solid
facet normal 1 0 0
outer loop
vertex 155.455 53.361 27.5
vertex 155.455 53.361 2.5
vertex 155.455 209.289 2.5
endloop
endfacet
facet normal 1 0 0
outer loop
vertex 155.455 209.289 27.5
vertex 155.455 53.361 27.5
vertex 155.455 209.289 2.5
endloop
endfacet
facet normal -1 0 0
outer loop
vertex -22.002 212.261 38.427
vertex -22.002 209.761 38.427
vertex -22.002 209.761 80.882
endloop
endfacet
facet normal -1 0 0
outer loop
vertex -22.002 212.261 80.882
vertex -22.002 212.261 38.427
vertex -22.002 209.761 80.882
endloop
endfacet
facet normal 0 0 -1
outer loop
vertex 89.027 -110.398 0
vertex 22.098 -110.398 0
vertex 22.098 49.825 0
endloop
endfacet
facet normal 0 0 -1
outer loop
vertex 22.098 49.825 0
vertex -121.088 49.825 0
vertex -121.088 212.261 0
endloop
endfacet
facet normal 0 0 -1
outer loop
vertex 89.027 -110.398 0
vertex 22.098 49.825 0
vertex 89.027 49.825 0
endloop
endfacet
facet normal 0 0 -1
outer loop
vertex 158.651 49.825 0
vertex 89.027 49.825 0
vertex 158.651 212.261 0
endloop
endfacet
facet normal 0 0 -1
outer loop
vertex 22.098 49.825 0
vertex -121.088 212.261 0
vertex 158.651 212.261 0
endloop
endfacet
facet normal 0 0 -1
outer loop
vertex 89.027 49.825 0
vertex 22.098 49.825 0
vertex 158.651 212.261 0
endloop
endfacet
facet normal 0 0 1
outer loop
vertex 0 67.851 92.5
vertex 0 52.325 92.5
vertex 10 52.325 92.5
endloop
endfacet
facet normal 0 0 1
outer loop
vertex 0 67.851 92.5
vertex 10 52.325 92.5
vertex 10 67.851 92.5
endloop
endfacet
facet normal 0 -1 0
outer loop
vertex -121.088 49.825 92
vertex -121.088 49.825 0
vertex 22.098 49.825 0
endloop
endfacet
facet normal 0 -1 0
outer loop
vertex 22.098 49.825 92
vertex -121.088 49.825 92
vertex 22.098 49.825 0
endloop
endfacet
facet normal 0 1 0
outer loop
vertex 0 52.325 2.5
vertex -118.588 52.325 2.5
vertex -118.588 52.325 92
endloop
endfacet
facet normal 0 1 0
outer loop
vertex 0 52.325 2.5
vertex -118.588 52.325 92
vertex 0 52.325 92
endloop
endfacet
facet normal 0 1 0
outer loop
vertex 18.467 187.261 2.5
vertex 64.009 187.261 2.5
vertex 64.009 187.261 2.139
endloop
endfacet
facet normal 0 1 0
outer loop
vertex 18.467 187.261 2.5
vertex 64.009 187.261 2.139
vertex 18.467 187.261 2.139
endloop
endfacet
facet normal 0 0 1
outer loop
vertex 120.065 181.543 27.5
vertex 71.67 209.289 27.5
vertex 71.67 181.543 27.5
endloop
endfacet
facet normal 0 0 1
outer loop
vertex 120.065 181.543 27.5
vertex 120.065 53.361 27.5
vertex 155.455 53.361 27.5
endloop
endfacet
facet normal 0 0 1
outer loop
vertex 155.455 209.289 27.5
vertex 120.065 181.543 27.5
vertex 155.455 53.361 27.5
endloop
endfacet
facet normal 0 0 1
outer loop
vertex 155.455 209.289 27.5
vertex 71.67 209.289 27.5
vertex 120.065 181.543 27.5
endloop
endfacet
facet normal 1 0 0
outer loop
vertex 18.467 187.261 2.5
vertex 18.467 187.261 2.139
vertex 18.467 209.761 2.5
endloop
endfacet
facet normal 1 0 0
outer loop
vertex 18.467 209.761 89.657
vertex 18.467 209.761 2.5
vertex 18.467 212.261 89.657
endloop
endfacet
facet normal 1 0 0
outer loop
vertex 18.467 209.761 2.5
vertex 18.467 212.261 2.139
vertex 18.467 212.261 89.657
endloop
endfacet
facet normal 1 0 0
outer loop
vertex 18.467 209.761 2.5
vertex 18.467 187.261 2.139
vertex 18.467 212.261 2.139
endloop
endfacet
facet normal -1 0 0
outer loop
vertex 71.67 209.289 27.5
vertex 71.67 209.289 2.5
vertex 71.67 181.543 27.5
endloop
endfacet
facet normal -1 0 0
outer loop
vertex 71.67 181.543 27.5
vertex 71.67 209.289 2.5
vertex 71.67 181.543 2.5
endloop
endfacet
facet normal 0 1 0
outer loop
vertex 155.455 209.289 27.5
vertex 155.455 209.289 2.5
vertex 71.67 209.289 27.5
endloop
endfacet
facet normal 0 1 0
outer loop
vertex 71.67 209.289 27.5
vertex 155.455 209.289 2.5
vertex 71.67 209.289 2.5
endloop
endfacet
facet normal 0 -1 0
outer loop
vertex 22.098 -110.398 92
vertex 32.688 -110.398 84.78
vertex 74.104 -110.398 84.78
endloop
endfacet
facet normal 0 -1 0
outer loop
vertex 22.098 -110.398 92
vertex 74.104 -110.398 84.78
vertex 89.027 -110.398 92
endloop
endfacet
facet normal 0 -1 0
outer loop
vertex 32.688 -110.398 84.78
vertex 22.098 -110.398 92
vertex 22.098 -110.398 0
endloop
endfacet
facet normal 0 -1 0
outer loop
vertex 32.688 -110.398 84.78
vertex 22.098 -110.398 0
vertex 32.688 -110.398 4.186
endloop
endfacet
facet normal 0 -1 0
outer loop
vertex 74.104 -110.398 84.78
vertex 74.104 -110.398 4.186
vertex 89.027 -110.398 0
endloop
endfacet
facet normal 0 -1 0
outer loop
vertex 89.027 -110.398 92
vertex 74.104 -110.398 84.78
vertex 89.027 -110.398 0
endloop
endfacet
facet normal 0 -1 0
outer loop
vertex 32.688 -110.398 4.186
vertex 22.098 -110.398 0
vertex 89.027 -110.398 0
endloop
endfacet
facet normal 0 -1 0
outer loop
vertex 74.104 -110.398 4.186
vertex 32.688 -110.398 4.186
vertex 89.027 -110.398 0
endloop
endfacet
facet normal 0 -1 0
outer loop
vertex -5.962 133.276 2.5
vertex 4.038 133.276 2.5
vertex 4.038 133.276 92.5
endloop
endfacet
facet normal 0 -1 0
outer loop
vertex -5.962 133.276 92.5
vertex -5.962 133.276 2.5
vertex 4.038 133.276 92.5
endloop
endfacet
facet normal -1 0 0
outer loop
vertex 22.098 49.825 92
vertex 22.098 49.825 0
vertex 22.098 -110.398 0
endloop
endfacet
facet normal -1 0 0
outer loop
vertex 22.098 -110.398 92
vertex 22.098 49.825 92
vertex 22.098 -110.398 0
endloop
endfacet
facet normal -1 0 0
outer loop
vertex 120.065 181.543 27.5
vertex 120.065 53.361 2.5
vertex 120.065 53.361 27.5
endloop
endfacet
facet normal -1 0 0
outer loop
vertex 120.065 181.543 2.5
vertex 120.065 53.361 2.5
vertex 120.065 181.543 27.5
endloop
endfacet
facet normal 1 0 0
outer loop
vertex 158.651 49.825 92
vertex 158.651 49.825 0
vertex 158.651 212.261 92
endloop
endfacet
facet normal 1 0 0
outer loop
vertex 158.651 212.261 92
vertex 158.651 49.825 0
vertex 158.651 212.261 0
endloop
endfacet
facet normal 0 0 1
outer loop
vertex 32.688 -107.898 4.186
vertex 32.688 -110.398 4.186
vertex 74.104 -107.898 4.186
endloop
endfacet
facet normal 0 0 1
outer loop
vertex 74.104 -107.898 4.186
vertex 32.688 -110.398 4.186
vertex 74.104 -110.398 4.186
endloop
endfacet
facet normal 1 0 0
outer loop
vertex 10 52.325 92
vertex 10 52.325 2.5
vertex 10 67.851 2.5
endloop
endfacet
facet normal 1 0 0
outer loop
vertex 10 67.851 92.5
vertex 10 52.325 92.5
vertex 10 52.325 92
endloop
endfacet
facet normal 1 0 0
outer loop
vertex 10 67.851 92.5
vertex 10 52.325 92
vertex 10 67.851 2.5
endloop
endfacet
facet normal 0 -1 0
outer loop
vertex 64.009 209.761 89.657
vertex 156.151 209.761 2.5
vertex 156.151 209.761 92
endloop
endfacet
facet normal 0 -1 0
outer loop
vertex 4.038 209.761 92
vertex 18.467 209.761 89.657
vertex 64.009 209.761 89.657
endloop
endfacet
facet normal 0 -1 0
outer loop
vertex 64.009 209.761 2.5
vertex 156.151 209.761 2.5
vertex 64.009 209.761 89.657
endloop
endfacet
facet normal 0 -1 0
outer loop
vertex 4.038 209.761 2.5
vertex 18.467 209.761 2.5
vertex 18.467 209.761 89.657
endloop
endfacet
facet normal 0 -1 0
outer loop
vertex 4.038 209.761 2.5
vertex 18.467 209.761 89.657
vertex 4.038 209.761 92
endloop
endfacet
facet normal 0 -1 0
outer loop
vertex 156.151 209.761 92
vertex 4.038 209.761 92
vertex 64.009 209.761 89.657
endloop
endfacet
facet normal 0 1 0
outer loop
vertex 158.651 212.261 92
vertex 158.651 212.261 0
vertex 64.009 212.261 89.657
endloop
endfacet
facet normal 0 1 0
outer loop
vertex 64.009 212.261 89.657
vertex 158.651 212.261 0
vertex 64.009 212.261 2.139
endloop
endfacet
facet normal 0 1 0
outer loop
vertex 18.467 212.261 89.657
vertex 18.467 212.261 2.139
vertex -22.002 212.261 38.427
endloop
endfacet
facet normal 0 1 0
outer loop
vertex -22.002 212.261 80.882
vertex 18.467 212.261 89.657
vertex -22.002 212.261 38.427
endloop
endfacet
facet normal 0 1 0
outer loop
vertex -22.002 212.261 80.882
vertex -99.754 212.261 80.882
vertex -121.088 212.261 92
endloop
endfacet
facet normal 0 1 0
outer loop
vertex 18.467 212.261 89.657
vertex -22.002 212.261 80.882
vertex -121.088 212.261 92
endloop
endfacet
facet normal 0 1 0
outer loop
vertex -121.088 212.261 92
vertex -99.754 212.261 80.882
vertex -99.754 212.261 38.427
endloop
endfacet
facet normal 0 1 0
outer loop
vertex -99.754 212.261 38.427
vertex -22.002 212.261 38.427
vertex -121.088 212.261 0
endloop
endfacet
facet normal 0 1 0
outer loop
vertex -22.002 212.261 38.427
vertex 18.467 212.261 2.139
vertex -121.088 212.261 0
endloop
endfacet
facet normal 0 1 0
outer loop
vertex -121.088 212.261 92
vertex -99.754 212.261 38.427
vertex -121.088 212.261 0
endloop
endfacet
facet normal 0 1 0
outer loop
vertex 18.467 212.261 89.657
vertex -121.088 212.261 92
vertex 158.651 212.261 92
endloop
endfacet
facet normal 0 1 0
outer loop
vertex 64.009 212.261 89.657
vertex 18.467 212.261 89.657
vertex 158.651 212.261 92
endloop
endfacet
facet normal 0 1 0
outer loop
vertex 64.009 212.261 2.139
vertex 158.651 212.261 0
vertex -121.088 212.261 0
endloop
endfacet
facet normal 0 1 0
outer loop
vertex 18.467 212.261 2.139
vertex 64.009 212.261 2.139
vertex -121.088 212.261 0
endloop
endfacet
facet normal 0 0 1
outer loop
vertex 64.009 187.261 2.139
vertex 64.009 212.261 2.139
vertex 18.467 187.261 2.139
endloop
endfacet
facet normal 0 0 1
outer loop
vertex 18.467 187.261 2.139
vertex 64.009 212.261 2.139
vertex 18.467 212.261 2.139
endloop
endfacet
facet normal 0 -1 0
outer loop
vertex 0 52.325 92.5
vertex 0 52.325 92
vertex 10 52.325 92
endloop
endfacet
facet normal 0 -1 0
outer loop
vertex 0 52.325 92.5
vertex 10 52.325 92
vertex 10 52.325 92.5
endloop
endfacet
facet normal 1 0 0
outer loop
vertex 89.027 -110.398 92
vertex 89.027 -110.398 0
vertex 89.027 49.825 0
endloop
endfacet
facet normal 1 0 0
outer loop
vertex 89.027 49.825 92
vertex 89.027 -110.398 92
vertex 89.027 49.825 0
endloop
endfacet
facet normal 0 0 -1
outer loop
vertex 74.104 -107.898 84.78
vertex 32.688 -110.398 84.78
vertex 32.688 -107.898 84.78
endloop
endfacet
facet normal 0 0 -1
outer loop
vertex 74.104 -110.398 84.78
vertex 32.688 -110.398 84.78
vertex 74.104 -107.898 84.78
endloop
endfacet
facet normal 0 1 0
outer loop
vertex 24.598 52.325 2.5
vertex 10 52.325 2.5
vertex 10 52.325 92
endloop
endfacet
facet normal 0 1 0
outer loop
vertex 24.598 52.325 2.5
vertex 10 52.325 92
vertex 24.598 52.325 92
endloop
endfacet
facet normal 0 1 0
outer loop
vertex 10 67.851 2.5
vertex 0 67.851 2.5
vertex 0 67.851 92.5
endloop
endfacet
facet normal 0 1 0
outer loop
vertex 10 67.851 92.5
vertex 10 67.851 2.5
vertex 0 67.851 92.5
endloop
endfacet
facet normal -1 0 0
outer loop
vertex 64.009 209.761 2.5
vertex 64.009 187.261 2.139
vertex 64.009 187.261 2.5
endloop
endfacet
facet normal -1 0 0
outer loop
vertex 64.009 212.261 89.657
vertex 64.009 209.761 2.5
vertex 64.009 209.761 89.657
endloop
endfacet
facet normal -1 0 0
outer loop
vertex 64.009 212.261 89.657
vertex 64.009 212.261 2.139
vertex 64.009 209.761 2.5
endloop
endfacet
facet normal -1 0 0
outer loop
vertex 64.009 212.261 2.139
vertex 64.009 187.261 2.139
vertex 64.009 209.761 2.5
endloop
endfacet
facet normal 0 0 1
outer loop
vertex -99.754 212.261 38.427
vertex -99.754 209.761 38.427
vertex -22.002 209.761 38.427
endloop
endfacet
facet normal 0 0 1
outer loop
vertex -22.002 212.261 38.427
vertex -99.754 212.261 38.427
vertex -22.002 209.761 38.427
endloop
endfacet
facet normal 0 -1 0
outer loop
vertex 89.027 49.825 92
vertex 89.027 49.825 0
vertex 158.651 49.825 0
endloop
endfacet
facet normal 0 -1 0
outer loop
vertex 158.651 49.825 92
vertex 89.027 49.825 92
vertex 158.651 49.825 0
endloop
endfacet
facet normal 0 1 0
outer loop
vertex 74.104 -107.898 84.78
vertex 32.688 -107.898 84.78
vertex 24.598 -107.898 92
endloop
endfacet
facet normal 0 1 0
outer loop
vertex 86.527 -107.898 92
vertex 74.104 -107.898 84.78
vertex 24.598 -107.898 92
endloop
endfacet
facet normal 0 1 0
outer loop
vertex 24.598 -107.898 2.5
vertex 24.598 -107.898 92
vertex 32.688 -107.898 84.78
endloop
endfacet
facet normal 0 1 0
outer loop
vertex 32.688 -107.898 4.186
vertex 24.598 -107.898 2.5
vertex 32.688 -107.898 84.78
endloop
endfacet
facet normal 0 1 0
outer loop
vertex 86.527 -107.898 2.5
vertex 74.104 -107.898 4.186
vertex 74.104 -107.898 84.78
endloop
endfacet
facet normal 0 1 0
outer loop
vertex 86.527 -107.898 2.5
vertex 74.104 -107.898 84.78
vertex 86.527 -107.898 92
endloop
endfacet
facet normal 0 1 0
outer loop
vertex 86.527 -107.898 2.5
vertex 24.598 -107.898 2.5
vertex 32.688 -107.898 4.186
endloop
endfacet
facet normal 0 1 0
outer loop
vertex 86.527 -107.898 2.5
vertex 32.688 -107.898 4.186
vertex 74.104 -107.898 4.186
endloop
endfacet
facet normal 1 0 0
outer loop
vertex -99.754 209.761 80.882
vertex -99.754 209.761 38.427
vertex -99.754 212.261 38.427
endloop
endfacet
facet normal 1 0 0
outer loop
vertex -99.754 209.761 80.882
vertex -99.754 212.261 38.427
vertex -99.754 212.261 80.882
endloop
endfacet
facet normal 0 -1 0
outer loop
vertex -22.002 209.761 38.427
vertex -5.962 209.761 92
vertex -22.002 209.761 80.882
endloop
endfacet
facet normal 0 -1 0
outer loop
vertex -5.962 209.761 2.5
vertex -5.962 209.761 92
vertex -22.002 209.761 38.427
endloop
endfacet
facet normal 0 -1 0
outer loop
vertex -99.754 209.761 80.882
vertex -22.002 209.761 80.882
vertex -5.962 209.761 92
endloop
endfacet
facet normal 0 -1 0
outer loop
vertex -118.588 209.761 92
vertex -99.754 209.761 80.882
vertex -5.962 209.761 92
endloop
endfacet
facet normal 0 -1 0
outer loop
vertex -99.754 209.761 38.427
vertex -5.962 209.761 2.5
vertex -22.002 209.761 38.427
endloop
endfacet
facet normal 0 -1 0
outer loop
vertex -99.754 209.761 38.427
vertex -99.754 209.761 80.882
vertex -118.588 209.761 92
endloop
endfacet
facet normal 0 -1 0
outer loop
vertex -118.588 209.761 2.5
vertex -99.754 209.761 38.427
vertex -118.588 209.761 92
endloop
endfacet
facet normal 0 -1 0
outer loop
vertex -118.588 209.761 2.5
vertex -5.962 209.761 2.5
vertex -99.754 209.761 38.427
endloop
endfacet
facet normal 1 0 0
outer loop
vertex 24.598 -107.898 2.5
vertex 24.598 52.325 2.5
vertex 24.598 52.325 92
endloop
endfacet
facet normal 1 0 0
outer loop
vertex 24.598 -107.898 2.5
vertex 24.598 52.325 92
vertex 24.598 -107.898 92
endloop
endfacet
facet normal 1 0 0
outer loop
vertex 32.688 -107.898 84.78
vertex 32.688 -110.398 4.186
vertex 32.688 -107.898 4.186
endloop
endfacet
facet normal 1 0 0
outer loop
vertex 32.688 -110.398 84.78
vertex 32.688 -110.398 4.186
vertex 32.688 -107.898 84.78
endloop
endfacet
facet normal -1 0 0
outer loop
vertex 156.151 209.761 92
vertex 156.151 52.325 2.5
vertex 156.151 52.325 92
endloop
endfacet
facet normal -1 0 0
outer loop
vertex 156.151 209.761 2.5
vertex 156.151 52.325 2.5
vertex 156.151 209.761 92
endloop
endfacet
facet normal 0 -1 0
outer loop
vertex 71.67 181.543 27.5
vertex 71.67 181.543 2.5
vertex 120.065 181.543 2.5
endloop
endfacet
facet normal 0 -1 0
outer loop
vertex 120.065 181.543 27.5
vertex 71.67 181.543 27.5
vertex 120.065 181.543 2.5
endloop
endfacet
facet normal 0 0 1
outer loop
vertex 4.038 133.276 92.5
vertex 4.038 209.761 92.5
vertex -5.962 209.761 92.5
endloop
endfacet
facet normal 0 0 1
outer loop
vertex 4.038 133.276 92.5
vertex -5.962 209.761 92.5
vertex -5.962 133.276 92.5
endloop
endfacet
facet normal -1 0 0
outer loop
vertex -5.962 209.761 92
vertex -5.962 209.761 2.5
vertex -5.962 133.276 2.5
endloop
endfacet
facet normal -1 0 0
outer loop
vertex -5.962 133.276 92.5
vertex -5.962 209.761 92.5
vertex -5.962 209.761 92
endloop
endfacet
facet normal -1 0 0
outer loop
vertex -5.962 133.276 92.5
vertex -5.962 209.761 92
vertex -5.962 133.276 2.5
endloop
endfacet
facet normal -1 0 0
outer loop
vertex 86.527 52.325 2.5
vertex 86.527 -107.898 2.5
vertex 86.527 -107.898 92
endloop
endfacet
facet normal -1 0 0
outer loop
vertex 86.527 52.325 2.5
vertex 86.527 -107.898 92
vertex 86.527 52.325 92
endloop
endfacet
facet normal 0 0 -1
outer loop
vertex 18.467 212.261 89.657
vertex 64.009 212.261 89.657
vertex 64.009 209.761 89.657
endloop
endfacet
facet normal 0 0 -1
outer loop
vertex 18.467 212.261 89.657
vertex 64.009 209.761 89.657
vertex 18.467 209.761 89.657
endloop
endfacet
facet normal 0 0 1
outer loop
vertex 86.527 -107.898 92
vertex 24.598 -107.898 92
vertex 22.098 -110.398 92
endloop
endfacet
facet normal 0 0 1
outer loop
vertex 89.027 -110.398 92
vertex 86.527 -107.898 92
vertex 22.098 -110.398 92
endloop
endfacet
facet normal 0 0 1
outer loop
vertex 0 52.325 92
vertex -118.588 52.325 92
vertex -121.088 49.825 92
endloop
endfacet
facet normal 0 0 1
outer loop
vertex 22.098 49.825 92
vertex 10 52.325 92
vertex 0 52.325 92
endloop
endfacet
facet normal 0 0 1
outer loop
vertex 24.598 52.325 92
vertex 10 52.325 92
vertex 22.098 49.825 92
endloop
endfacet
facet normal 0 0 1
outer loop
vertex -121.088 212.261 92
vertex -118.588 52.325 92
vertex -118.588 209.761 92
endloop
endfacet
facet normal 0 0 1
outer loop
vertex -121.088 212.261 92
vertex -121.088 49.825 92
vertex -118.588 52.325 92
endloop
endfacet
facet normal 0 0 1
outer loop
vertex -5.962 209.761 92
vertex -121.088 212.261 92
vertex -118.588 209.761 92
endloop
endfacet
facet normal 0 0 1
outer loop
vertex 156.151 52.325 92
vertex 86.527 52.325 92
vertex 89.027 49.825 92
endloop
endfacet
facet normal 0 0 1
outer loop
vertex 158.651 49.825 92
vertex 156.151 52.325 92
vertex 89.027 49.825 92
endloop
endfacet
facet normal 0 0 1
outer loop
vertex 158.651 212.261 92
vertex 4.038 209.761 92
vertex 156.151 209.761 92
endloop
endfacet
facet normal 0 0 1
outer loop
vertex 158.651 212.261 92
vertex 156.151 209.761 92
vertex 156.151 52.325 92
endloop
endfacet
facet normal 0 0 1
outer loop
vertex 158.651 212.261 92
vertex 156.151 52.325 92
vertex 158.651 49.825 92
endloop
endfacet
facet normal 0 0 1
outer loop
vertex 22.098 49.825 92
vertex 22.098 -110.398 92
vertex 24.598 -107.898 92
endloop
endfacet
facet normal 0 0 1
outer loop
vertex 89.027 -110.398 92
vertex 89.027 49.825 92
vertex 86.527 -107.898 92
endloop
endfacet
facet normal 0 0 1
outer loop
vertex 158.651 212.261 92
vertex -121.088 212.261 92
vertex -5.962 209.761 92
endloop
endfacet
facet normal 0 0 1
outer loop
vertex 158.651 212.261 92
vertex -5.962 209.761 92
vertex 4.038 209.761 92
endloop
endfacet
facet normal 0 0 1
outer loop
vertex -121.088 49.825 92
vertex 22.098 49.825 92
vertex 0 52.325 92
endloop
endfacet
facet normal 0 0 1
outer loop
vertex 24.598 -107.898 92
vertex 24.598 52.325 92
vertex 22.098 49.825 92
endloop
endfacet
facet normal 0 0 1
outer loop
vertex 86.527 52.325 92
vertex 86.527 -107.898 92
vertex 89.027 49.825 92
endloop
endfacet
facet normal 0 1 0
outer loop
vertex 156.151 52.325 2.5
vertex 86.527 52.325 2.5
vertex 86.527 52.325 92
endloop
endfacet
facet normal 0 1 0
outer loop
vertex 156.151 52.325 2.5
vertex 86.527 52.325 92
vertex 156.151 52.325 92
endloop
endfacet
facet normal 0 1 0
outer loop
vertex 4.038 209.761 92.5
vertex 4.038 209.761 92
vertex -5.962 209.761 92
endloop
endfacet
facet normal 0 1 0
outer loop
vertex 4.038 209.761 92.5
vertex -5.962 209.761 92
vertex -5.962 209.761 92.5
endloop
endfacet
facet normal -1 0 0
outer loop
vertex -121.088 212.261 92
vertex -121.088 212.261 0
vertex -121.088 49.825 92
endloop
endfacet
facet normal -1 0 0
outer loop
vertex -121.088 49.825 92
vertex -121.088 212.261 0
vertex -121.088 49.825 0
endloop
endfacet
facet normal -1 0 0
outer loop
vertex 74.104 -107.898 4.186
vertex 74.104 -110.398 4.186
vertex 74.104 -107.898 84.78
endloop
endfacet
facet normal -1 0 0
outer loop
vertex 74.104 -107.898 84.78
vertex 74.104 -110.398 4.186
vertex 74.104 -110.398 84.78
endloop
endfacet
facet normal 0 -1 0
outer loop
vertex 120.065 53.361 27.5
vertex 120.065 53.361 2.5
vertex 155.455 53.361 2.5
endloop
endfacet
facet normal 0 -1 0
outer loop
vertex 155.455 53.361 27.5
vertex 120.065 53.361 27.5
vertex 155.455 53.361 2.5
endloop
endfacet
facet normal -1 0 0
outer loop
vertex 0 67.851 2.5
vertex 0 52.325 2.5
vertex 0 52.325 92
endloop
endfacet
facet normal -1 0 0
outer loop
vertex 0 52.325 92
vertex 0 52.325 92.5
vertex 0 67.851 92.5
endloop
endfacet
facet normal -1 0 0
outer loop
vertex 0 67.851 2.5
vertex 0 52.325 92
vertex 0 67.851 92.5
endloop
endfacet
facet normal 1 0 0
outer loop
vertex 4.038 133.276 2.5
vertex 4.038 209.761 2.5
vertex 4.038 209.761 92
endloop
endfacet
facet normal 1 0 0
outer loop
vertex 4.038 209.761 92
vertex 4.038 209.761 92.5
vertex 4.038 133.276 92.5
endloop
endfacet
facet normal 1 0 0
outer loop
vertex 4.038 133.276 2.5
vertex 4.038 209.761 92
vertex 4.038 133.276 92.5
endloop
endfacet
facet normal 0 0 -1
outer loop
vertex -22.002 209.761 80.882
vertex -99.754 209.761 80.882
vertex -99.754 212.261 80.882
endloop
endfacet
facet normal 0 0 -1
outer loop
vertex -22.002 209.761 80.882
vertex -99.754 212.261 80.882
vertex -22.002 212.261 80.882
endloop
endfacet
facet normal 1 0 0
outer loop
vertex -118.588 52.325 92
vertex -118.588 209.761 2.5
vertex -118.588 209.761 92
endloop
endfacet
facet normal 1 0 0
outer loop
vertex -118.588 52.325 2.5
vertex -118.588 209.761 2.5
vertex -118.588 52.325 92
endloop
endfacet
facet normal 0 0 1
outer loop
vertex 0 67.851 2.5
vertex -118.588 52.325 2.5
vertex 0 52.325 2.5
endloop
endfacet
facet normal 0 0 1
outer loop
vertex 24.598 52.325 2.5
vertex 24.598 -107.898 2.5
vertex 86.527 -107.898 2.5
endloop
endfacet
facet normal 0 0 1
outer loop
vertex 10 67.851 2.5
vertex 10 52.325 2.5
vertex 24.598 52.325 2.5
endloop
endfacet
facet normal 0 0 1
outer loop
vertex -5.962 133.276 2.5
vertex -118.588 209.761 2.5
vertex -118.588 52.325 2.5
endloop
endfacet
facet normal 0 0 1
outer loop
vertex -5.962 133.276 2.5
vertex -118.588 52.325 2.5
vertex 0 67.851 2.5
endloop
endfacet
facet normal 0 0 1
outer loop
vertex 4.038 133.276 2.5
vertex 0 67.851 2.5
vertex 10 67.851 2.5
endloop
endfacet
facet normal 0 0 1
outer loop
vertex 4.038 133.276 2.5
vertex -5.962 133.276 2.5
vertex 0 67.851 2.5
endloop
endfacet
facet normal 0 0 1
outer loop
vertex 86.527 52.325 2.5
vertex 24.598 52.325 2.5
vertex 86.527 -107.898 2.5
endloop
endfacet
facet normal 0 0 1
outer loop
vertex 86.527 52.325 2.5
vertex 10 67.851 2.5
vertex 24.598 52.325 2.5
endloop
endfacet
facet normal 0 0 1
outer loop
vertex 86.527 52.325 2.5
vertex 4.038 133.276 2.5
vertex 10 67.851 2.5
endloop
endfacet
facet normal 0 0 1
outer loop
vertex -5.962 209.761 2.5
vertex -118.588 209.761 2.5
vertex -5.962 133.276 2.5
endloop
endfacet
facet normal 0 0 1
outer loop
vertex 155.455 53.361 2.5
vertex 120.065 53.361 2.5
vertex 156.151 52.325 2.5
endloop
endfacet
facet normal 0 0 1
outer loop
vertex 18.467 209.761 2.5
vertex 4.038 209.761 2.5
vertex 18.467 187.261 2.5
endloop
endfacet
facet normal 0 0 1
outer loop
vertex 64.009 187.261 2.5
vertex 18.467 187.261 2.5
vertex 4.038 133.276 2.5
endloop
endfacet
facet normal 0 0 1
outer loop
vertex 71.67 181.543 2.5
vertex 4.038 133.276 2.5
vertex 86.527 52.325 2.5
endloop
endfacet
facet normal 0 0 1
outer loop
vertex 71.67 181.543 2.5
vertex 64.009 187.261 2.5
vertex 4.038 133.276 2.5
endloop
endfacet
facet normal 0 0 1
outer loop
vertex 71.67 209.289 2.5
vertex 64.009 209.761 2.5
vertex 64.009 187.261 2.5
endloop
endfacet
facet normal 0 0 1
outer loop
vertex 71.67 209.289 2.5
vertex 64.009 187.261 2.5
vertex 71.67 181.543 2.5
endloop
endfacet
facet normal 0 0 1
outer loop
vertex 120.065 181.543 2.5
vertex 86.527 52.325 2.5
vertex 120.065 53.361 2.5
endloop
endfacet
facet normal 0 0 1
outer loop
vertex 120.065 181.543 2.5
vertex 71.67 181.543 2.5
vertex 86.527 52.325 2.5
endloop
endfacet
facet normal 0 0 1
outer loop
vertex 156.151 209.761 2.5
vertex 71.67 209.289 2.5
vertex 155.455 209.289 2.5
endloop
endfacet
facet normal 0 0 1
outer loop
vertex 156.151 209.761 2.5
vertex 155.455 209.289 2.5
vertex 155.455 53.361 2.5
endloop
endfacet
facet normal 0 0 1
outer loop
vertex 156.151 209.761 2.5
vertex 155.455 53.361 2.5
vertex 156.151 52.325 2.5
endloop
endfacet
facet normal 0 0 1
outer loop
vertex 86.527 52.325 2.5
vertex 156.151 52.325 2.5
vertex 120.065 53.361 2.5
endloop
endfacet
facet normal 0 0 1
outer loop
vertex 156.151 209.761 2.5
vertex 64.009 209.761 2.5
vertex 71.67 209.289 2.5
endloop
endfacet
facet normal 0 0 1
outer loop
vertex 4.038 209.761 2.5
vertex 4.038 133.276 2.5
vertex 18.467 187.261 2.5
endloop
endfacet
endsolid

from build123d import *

# Parameters (mm, degrees)
F1_DEPTH  = 92
F2_T      = -2.5
F4_E13_W  = 76.4850056171
F4_E13_H  = 90
F5_DEPTH  = 10
F7_E14_W  = 15.5262811482
F7_E14_H  = 90
F8_DEPTH  = 10
F9_W      = 41.4156280458
F9_H      = 80.5949582718
F10_DEPTH = 25
F12_W     = 45.5428082496
F12_H     = 87.5177572016
F13_DEPTH = 25
F14_W     = 77.7512546629
F14_H     = 42.4544923007
F15_DEPTH = 25
F16_W     = 35.3893190622
F16_H     = 128.1821280718
F17_DEPTH = 25


with BuildPart() as f1:
    # F0 (on Top) → F1 (new body)
    with BuildSketch(Plane.XY):
        Polygon((22.0979973674, 49.8246140778), (22.0979973674, -110.3982031345), (89.0265107155, -110.3982031345), (89.0265107155, 49.8246140778), (158.6511880159, 49.8246140778), (158.6511880159, 212.2613489628), (0, 212.2613489628), (-121.0884749889, 212.2613489628), (-121.0884749889, 49.8246140778), (0, 49.8246140778), align=None)
    extrude(amount=F1_DEPTH)

    # F2
    f2_openings = [f1.faces().sort_by_distance(p)[0] for p in [
        (25.804053, 100.239761, 92),
    ]]
    offset(amount=F2_T, openings=f2_openings, kind=Kind.INTERSECTION)

    # F4_E13 (on explicit) → F5 (join)
    with BuildSketch(Plane(origin=(4.0378416888, 209.7613489628, 2.5), x_dir=(0, -1, 0), z_dir=(-1, 0, 0))):
        with Locations((38.2425028086, 45)):
            Rectangle(F4_E13_W, F4_E13_H)
    extrude(amount=F5_DEPTH)

    # F7_E14 (on explicit) → F8 (join)
    with BuildSketch(Plane(origin=(0, 52.3246140778, 2.5), x_dir=(0, 1, 0), z_dir=(1, 0, 0))):
        with Locations((7.7631405741, 45)):
            Rectangle(F7_E14_W, F7_E14_H)
    extrude(amount=F8_DEPTH)

    # F9 (on face) → F10 (cut)
    with BuildSketch(Plane.XZ.offset(110.3982031345)):
        with Locations((53.3959884197, 44.4829904009)):
            Rectangle(F9_W, F9_H)
    extrude(amount=-F10_DEPTH, mode=Mode.SUBTRACT)

    # F12 (on face) → F13 (cut)
    with BuildSketch(Plane(origin=(0, 212.2613489628, 0), x_dir=(-1, 0, 0), z_dir=(0, 1, 0))):
        with Locations((-41.2379493937, 45.8978245733)):
            Rectangle(F12_W, F12_H)
    extrude(amount=-F13_DEPTH, mode=Mode.SUBTRACT)

    # F14 (on face) → F15 (cut)
    with BuildSketch(Plane.XZ.offset(-209.7613489628)):
        with Locations((-60.8778791502, 59.6545059234)):
            Rectangle(F14_W, F14_H)
    extrude(amount=-F15_DEPTH, mode=Mode.SUBTRACT)

    # F16 (on face) → F17 (join)
    with BuildSketch(Plane.XY.offset(2.5)):
        Polygon((155.4546654224, 209.2887163162), (71.6699585319, 209.2887163162), (71.6699585319, 181.543186307), (120.0653463602, 181.543186307), (155.4546654224, 181.543186307), align=None)
        with Locations((137.7600058913, 117.4521222711)):
            Rectangle(F16_W, F16_H)
    extrude(amount=F17_DEPTH)


solid = f1.part
